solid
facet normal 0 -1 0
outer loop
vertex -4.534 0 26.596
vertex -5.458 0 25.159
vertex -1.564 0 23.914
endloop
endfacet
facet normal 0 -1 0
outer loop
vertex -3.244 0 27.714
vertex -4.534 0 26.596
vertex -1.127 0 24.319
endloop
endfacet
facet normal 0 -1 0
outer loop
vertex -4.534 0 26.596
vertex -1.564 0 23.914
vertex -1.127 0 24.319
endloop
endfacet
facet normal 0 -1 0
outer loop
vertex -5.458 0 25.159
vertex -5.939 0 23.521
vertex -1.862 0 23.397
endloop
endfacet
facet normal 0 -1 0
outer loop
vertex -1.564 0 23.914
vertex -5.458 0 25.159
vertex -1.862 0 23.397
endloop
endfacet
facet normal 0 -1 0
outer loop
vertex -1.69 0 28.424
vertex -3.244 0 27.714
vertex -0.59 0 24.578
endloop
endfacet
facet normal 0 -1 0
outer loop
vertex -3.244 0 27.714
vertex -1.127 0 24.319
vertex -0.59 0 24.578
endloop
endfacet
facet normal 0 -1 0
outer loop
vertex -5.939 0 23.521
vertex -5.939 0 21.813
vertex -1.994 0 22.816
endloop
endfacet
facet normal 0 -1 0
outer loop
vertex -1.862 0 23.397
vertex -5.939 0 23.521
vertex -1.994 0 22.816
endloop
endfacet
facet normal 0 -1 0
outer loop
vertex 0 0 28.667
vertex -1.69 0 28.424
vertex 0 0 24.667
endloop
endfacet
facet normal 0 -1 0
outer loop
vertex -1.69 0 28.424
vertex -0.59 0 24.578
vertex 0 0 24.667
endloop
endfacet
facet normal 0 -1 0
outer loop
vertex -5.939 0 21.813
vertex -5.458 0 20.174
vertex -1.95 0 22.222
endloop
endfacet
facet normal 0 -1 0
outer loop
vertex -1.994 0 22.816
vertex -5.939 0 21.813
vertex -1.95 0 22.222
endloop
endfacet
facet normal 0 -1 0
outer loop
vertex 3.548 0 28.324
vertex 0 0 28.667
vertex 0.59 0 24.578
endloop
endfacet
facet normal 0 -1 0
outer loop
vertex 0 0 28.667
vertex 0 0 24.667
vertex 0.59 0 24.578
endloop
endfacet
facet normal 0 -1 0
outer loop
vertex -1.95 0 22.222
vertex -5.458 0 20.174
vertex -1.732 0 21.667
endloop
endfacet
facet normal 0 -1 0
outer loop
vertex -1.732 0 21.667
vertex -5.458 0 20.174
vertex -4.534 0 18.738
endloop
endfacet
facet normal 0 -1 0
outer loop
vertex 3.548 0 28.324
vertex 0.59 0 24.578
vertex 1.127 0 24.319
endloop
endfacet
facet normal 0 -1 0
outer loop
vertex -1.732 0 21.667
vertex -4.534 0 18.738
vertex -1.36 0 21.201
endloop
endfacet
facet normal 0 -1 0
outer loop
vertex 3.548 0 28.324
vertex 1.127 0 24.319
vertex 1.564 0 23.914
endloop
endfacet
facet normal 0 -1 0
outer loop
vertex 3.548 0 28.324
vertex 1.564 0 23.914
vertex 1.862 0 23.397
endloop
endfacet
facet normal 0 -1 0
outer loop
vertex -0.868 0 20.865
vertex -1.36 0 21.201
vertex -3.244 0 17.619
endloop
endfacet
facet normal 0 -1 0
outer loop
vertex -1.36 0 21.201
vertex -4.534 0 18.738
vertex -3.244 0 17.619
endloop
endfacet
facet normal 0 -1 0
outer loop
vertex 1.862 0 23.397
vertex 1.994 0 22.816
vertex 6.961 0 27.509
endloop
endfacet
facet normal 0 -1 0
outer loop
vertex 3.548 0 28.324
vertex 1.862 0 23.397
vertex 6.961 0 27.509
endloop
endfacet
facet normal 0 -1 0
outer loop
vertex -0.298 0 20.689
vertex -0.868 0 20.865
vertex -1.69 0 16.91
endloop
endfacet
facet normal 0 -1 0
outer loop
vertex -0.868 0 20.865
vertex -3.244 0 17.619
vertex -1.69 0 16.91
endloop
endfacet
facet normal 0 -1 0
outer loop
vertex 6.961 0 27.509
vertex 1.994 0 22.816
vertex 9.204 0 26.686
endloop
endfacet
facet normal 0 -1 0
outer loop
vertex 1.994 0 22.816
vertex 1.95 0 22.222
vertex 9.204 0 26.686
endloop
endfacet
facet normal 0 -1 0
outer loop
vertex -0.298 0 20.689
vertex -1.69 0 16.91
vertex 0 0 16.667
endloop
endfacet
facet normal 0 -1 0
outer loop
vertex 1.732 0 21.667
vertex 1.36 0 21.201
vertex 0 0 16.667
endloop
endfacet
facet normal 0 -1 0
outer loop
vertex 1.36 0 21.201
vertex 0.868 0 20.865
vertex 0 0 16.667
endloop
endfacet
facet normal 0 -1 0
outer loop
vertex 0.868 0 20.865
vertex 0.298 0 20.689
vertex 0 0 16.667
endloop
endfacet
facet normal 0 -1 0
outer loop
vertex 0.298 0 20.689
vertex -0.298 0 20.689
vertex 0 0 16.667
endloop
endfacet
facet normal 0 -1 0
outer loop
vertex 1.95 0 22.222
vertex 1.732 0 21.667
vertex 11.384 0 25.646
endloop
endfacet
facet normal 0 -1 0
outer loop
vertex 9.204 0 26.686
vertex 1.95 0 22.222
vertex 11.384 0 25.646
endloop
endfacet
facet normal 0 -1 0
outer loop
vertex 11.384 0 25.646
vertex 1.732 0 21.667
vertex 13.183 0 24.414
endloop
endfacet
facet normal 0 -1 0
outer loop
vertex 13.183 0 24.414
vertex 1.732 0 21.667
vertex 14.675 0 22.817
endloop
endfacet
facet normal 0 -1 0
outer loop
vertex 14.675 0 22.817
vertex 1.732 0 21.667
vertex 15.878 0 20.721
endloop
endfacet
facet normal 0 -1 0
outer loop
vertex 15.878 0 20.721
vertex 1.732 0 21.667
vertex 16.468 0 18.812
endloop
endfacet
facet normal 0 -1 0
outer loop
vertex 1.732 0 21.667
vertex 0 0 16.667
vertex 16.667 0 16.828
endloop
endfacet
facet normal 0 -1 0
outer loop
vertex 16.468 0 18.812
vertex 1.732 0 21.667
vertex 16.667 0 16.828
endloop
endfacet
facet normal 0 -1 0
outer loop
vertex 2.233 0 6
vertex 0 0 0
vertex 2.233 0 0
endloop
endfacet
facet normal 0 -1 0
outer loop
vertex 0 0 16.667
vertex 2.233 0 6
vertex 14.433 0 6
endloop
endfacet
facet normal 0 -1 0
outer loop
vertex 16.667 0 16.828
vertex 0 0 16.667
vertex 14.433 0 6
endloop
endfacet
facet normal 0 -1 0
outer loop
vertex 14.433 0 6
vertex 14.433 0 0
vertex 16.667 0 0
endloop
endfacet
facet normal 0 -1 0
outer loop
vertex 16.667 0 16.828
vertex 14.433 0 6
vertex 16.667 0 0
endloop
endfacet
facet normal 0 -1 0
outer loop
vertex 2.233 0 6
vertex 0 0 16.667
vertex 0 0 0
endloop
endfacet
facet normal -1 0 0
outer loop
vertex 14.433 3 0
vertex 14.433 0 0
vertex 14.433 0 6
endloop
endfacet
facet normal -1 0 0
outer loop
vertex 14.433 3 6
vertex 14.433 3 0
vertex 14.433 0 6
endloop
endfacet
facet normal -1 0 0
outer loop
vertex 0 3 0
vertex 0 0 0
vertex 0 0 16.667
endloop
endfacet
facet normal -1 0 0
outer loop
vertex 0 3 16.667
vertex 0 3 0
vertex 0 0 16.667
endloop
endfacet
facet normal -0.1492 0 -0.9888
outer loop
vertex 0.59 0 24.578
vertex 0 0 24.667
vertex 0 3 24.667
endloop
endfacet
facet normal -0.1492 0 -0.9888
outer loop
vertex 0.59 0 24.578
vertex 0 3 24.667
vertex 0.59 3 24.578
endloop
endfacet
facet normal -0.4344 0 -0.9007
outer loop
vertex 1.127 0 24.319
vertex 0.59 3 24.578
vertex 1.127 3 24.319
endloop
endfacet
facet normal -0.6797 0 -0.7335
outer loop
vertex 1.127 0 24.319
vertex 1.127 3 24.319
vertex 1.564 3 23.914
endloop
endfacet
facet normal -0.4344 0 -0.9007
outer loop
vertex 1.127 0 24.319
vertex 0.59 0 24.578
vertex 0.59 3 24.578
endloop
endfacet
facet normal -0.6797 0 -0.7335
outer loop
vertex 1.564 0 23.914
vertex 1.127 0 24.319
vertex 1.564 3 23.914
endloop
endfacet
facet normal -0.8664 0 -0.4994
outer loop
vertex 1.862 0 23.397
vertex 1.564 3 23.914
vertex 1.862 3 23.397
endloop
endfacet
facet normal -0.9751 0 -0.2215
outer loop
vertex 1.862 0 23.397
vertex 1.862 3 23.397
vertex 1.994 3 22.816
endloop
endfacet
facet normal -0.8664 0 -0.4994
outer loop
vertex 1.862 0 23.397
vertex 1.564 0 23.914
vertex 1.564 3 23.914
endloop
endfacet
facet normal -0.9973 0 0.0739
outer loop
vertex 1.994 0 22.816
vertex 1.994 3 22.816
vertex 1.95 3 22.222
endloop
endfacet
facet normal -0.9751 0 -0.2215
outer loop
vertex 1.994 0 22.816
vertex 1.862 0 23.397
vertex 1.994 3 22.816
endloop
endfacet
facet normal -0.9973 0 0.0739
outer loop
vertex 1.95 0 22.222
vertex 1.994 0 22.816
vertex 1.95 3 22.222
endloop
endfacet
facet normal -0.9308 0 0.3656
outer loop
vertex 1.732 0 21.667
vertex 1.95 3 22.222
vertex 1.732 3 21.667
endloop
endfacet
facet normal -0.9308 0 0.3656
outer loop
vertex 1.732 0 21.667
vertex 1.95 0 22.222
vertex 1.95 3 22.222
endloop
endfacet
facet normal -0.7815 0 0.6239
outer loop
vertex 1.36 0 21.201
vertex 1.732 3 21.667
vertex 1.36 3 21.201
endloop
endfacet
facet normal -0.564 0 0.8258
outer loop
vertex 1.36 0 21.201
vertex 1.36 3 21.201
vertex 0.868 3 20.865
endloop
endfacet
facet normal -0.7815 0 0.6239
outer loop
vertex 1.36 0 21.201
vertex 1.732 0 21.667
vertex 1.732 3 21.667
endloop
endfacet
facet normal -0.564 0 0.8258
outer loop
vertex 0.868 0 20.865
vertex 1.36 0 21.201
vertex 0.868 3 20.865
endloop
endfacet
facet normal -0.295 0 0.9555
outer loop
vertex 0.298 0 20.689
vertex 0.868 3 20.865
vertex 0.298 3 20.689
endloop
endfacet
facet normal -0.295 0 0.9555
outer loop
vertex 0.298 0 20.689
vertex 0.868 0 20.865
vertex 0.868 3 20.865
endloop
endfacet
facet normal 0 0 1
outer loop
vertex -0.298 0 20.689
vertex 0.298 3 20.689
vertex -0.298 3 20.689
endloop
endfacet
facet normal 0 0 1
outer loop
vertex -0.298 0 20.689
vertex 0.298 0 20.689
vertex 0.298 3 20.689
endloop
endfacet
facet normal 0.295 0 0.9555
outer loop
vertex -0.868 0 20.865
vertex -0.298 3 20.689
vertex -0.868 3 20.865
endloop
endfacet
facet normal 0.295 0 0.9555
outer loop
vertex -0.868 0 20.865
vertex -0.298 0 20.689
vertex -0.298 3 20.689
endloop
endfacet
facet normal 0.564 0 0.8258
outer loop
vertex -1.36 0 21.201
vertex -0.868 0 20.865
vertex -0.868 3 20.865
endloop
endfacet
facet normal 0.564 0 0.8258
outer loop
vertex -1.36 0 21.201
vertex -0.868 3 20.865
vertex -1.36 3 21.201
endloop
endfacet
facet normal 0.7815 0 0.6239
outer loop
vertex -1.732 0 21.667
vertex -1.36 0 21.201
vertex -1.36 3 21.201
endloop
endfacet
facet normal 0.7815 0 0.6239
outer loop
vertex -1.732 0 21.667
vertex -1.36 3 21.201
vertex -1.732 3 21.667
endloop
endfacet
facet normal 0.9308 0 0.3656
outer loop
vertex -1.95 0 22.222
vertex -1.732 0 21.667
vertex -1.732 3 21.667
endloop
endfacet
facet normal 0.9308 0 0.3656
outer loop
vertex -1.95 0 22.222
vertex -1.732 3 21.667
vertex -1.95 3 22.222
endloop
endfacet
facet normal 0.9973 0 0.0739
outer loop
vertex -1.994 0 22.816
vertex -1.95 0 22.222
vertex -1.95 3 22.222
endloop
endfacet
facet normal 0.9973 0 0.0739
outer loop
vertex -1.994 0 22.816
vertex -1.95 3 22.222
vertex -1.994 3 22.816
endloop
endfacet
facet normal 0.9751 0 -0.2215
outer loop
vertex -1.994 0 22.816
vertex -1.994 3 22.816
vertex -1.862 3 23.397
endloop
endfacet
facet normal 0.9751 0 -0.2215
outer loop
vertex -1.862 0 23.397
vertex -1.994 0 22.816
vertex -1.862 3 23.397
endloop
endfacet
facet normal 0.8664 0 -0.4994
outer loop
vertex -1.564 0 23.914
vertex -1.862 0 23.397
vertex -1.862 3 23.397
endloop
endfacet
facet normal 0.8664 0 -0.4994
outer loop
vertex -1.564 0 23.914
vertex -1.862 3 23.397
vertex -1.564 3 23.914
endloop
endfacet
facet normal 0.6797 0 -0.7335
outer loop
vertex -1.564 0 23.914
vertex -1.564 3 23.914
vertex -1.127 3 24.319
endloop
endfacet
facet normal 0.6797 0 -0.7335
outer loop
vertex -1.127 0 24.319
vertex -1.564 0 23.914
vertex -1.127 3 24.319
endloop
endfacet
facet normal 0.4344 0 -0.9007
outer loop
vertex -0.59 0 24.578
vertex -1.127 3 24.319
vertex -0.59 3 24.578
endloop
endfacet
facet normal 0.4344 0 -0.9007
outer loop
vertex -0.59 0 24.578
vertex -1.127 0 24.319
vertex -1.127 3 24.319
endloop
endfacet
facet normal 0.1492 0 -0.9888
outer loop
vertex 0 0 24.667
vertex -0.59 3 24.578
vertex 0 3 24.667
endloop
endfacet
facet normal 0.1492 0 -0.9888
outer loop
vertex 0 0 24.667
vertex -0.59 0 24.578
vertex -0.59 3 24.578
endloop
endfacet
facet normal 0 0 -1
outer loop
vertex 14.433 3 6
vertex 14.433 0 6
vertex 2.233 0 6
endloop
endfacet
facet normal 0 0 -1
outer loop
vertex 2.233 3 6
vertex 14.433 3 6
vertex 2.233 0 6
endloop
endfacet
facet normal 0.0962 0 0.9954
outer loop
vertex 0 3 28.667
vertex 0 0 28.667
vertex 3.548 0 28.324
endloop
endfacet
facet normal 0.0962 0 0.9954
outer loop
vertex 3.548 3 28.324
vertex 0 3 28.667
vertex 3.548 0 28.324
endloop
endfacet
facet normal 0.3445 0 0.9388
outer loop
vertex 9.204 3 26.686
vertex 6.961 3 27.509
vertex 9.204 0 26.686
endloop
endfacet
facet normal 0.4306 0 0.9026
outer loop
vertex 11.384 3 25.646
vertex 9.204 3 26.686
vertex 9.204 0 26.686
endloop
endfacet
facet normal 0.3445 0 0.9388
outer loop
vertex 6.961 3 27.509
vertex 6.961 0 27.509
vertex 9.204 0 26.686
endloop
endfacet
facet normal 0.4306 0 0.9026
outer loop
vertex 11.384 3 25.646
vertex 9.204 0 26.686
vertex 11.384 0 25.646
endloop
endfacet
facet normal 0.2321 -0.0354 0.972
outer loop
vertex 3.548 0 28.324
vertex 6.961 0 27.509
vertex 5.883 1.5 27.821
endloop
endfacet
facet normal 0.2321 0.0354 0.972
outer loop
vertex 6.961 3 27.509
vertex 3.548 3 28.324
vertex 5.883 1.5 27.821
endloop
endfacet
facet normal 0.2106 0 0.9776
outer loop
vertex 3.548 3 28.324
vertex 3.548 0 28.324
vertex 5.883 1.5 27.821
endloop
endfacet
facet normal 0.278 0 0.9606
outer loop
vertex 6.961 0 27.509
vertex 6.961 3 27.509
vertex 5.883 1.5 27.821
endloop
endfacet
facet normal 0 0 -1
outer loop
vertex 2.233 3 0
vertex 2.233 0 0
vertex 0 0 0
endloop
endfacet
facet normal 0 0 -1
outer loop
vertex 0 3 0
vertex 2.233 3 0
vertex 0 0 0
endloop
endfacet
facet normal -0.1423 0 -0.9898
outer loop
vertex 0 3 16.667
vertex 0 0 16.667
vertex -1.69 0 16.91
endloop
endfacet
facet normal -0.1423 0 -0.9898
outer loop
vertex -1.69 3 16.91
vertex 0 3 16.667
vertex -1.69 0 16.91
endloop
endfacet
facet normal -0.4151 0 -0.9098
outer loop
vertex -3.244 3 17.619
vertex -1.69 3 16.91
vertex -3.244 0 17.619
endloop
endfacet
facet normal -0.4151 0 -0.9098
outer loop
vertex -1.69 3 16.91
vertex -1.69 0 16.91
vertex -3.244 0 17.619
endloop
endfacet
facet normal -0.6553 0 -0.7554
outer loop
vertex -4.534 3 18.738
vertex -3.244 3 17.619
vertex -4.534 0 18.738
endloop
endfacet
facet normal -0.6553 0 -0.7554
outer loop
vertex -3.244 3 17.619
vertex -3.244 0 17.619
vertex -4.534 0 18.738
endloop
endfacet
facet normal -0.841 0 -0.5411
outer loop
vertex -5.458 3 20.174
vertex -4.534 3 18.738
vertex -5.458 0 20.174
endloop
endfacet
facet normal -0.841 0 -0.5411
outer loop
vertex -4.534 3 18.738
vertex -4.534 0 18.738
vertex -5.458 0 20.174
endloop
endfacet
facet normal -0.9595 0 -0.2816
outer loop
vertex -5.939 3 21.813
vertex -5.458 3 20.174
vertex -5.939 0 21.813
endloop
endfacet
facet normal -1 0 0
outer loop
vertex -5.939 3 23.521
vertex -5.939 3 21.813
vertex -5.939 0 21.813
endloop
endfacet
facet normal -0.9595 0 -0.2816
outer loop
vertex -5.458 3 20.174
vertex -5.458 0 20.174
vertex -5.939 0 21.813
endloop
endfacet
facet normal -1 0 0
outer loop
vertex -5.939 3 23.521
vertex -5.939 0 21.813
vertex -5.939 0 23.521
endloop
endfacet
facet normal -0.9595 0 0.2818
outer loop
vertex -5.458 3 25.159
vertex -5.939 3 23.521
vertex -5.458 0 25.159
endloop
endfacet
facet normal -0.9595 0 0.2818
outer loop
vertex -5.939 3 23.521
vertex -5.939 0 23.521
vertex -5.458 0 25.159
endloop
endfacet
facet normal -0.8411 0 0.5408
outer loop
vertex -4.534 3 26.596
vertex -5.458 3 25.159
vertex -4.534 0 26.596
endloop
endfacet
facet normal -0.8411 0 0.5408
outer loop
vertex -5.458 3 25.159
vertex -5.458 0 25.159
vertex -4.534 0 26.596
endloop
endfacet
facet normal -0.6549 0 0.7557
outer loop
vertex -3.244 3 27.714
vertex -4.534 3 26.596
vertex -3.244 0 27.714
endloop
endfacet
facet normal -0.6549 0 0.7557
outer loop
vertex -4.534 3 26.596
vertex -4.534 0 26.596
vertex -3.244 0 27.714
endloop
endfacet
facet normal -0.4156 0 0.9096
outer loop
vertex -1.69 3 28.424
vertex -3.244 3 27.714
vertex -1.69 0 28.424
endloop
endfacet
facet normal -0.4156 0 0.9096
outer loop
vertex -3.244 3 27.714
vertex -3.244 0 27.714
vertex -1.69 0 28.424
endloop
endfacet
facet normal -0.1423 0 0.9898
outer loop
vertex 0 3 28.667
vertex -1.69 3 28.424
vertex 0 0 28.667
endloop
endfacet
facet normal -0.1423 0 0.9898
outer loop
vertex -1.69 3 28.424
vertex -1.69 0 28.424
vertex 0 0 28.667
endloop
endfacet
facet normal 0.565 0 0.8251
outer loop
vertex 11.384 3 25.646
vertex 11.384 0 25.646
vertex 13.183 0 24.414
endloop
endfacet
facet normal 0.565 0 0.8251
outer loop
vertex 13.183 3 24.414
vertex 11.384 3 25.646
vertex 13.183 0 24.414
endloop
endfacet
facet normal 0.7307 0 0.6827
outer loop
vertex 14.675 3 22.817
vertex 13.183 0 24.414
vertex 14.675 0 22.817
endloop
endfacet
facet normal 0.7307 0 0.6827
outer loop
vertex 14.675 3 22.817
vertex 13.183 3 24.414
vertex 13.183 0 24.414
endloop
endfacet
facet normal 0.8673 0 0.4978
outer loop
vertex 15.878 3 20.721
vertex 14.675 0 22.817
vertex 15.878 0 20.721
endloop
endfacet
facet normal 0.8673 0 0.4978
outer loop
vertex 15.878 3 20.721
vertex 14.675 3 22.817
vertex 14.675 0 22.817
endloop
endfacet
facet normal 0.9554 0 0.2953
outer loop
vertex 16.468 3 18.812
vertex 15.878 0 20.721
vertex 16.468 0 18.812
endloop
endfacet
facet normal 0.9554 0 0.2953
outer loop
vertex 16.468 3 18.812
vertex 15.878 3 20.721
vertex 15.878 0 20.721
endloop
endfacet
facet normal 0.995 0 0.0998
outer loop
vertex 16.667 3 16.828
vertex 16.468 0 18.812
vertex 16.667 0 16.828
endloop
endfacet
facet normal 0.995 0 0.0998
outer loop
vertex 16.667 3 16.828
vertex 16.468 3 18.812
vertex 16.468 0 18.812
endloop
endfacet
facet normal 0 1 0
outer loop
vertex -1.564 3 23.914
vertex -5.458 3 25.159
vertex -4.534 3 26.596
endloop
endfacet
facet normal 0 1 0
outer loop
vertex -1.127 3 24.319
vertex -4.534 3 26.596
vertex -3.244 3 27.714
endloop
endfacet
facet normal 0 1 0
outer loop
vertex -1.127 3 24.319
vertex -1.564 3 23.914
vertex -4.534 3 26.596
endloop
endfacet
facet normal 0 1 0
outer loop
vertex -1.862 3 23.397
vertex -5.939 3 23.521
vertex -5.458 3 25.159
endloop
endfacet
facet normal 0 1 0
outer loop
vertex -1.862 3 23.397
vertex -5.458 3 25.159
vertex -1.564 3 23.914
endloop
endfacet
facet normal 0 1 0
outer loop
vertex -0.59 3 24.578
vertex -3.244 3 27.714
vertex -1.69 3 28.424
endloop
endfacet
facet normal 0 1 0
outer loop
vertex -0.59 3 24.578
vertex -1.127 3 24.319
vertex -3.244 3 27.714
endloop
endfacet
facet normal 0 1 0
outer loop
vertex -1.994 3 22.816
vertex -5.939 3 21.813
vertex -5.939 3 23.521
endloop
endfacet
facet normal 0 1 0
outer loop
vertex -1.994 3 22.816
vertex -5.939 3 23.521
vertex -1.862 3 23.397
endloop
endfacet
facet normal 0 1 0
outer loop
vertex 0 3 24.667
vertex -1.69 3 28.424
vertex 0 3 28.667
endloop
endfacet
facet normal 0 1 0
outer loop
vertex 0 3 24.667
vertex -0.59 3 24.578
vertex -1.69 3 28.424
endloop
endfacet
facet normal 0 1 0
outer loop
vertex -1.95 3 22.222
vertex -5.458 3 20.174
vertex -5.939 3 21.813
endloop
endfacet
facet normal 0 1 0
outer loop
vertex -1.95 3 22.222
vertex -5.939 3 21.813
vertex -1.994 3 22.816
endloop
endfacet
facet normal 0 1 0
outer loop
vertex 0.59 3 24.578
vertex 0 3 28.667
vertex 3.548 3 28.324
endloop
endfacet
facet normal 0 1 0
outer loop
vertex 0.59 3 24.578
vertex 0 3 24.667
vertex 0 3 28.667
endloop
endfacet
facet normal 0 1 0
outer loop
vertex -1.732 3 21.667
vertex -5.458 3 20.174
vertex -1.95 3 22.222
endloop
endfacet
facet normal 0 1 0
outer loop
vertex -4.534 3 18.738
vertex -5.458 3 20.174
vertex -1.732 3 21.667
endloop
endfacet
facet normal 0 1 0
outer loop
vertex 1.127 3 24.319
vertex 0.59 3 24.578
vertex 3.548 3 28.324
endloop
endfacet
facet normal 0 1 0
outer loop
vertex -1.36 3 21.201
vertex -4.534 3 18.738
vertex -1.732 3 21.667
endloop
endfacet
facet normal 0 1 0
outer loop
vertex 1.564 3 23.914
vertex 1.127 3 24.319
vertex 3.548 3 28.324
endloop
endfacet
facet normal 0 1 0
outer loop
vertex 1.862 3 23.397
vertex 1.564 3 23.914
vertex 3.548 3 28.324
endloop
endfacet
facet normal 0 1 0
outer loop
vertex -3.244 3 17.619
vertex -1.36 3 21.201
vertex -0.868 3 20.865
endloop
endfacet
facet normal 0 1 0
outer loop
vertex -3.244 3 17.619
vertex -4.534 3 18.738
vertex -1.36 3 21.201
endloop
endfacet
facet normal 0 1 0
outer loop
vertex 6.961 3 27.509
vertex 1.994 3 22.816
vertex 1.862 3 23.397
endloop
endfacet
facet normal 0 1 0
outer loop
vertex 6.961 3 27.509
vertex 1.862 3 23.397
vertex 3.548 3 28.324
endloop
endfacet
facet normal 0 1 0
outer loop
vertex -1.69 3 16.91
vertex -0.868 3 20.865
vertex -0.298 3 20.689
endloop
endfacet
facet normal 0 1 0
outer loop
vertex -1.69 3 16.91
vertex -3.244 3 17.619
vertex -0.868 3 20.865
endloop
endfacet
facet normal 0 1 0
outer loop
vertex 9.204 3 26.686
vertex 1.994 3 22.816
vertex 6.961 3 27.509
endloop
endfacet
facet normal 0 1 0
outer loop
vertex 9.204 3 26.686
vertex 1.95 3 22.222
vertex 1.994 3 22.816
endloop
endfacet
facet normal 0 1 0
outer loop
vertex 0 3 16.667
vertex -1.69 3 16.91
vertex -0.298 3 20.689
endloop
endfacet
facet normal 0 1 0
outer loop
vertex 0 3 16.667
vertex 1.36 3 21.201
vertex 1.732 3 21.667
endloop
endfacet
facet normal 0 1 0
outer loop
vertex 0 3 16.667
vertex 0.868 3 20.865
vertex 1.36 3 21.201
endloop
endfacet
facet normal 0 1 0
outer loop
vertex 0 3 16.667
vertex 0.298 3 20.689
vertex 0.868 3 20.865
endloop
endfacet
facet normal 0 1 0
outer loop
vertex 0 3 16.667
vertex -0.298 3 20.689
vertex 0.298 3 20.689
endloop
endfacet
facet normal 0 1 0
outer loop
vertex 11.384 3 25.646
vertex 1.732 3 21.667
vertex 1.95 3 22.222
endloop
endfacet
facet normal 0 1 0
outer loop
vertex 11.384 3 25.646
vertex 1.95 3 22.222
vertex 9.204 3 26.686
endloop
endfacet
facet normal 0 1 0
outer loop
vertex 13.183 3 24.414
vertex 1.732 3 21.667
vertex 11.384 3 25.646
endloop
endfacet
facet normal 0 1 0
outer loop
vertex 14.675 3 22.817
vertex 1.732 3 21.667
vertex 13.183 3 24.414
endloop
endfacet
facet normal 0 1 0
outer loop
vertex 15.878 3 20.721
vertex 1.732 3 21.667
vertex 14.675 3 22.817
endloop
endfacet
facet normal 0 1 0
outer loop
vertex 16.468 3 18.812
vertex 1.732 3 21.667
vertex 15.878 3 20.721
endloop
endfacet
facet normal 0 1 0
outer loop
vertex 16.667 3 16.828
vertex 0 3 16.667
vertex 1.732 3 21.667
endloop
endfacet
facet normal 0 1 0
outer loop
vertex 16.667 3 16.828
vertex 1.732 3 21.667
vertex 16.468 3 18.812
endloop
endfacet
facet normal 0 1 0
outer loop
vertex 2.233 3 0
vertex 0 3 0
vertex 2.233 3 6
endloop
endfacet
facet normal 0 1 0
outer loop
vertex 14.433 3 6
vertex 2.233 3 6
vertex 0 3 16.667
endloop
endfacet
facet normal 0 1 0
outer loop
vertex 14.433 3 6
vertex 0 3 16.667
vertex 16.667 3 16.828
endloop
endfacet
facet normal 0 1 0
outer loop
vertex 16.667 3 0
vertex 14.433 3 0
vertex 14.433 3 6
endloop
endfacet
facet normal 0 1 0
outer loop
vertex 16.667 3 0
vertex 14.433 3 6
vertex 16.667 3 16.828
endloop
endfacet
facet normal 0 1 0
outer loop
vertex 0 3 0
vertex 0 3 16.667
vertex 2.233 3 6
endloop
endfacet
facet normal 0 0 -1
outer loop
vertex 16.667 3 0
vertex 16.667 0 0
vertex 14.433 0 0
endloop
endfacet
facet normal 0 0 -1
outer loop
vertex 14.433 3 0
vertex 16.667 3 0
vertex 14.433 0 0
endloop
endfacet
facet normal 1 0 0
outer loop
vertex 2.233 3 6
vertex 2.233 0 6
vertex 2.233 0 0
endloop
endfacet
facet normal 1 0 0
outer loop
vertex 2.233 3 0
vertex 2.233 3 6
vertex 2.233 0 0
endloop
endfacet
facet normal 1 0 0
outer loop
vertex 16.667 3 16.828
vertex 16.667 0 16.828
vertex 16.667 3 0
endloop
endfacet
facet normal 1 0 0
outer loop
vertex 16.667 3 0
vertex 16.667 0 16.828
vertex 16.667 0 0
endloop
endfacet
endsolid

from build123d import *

# Parameters (mm, degrees)
SKETCH_1_R      = 2
EXTRUDE_1_DEPTH = 3
FILLET_1_R      = 10


with BuildPart() as part:
    # 草图1 → 凸台-拉伸1 (new body)
    with BuildSketch(Plane(origin=(0, 0, 0), x_dir=(1, 0, 0), z_dir=(0, 1, 0))):
        with BuildLine():
            Line((2.233333333, 0), (0, 0))
            Line((0, 0), (0, -16.666666667))
            ThreePointArc((0, -16.666666667), (-6, -22.666666667), (0, -28.666666667))
            add(Edge.make_bspline(
                [(0, -28.666666667), (9.212627714, -28.392938173), (16.666666667, -22)],
                knots=[0, 0, 0, 1, 1, 1], degree=2))
            Line((16.666666667, -22), (16.666666667, 0))
            Line((16.666666667, 0), (14.433333333, 0))
            Line((14.433333333, 0), (14.433333333, -6))
            Line((14.433333333, -6), (2.233333333, -6))
            Line((2.233333333, -6), (2.233333333, 0))
        make_face()
        with Locations(Location((0, -22.666666667, 0), (0, 0, 270))):
            Circle(SKETCH_1_R, mode=Mode.SUBTRACT)
    extrude(amount=EXTRUDE_1_DEPTH)

    # 圆角1
    fillet_1_edges = [part.edges().sort_by_distance(p)[0] for p in [
        (16.666666667, 1.5, 22),
    ]]
    fillet(fillet_1_edges, radius=FILLET_1_R)


solid = part.part
